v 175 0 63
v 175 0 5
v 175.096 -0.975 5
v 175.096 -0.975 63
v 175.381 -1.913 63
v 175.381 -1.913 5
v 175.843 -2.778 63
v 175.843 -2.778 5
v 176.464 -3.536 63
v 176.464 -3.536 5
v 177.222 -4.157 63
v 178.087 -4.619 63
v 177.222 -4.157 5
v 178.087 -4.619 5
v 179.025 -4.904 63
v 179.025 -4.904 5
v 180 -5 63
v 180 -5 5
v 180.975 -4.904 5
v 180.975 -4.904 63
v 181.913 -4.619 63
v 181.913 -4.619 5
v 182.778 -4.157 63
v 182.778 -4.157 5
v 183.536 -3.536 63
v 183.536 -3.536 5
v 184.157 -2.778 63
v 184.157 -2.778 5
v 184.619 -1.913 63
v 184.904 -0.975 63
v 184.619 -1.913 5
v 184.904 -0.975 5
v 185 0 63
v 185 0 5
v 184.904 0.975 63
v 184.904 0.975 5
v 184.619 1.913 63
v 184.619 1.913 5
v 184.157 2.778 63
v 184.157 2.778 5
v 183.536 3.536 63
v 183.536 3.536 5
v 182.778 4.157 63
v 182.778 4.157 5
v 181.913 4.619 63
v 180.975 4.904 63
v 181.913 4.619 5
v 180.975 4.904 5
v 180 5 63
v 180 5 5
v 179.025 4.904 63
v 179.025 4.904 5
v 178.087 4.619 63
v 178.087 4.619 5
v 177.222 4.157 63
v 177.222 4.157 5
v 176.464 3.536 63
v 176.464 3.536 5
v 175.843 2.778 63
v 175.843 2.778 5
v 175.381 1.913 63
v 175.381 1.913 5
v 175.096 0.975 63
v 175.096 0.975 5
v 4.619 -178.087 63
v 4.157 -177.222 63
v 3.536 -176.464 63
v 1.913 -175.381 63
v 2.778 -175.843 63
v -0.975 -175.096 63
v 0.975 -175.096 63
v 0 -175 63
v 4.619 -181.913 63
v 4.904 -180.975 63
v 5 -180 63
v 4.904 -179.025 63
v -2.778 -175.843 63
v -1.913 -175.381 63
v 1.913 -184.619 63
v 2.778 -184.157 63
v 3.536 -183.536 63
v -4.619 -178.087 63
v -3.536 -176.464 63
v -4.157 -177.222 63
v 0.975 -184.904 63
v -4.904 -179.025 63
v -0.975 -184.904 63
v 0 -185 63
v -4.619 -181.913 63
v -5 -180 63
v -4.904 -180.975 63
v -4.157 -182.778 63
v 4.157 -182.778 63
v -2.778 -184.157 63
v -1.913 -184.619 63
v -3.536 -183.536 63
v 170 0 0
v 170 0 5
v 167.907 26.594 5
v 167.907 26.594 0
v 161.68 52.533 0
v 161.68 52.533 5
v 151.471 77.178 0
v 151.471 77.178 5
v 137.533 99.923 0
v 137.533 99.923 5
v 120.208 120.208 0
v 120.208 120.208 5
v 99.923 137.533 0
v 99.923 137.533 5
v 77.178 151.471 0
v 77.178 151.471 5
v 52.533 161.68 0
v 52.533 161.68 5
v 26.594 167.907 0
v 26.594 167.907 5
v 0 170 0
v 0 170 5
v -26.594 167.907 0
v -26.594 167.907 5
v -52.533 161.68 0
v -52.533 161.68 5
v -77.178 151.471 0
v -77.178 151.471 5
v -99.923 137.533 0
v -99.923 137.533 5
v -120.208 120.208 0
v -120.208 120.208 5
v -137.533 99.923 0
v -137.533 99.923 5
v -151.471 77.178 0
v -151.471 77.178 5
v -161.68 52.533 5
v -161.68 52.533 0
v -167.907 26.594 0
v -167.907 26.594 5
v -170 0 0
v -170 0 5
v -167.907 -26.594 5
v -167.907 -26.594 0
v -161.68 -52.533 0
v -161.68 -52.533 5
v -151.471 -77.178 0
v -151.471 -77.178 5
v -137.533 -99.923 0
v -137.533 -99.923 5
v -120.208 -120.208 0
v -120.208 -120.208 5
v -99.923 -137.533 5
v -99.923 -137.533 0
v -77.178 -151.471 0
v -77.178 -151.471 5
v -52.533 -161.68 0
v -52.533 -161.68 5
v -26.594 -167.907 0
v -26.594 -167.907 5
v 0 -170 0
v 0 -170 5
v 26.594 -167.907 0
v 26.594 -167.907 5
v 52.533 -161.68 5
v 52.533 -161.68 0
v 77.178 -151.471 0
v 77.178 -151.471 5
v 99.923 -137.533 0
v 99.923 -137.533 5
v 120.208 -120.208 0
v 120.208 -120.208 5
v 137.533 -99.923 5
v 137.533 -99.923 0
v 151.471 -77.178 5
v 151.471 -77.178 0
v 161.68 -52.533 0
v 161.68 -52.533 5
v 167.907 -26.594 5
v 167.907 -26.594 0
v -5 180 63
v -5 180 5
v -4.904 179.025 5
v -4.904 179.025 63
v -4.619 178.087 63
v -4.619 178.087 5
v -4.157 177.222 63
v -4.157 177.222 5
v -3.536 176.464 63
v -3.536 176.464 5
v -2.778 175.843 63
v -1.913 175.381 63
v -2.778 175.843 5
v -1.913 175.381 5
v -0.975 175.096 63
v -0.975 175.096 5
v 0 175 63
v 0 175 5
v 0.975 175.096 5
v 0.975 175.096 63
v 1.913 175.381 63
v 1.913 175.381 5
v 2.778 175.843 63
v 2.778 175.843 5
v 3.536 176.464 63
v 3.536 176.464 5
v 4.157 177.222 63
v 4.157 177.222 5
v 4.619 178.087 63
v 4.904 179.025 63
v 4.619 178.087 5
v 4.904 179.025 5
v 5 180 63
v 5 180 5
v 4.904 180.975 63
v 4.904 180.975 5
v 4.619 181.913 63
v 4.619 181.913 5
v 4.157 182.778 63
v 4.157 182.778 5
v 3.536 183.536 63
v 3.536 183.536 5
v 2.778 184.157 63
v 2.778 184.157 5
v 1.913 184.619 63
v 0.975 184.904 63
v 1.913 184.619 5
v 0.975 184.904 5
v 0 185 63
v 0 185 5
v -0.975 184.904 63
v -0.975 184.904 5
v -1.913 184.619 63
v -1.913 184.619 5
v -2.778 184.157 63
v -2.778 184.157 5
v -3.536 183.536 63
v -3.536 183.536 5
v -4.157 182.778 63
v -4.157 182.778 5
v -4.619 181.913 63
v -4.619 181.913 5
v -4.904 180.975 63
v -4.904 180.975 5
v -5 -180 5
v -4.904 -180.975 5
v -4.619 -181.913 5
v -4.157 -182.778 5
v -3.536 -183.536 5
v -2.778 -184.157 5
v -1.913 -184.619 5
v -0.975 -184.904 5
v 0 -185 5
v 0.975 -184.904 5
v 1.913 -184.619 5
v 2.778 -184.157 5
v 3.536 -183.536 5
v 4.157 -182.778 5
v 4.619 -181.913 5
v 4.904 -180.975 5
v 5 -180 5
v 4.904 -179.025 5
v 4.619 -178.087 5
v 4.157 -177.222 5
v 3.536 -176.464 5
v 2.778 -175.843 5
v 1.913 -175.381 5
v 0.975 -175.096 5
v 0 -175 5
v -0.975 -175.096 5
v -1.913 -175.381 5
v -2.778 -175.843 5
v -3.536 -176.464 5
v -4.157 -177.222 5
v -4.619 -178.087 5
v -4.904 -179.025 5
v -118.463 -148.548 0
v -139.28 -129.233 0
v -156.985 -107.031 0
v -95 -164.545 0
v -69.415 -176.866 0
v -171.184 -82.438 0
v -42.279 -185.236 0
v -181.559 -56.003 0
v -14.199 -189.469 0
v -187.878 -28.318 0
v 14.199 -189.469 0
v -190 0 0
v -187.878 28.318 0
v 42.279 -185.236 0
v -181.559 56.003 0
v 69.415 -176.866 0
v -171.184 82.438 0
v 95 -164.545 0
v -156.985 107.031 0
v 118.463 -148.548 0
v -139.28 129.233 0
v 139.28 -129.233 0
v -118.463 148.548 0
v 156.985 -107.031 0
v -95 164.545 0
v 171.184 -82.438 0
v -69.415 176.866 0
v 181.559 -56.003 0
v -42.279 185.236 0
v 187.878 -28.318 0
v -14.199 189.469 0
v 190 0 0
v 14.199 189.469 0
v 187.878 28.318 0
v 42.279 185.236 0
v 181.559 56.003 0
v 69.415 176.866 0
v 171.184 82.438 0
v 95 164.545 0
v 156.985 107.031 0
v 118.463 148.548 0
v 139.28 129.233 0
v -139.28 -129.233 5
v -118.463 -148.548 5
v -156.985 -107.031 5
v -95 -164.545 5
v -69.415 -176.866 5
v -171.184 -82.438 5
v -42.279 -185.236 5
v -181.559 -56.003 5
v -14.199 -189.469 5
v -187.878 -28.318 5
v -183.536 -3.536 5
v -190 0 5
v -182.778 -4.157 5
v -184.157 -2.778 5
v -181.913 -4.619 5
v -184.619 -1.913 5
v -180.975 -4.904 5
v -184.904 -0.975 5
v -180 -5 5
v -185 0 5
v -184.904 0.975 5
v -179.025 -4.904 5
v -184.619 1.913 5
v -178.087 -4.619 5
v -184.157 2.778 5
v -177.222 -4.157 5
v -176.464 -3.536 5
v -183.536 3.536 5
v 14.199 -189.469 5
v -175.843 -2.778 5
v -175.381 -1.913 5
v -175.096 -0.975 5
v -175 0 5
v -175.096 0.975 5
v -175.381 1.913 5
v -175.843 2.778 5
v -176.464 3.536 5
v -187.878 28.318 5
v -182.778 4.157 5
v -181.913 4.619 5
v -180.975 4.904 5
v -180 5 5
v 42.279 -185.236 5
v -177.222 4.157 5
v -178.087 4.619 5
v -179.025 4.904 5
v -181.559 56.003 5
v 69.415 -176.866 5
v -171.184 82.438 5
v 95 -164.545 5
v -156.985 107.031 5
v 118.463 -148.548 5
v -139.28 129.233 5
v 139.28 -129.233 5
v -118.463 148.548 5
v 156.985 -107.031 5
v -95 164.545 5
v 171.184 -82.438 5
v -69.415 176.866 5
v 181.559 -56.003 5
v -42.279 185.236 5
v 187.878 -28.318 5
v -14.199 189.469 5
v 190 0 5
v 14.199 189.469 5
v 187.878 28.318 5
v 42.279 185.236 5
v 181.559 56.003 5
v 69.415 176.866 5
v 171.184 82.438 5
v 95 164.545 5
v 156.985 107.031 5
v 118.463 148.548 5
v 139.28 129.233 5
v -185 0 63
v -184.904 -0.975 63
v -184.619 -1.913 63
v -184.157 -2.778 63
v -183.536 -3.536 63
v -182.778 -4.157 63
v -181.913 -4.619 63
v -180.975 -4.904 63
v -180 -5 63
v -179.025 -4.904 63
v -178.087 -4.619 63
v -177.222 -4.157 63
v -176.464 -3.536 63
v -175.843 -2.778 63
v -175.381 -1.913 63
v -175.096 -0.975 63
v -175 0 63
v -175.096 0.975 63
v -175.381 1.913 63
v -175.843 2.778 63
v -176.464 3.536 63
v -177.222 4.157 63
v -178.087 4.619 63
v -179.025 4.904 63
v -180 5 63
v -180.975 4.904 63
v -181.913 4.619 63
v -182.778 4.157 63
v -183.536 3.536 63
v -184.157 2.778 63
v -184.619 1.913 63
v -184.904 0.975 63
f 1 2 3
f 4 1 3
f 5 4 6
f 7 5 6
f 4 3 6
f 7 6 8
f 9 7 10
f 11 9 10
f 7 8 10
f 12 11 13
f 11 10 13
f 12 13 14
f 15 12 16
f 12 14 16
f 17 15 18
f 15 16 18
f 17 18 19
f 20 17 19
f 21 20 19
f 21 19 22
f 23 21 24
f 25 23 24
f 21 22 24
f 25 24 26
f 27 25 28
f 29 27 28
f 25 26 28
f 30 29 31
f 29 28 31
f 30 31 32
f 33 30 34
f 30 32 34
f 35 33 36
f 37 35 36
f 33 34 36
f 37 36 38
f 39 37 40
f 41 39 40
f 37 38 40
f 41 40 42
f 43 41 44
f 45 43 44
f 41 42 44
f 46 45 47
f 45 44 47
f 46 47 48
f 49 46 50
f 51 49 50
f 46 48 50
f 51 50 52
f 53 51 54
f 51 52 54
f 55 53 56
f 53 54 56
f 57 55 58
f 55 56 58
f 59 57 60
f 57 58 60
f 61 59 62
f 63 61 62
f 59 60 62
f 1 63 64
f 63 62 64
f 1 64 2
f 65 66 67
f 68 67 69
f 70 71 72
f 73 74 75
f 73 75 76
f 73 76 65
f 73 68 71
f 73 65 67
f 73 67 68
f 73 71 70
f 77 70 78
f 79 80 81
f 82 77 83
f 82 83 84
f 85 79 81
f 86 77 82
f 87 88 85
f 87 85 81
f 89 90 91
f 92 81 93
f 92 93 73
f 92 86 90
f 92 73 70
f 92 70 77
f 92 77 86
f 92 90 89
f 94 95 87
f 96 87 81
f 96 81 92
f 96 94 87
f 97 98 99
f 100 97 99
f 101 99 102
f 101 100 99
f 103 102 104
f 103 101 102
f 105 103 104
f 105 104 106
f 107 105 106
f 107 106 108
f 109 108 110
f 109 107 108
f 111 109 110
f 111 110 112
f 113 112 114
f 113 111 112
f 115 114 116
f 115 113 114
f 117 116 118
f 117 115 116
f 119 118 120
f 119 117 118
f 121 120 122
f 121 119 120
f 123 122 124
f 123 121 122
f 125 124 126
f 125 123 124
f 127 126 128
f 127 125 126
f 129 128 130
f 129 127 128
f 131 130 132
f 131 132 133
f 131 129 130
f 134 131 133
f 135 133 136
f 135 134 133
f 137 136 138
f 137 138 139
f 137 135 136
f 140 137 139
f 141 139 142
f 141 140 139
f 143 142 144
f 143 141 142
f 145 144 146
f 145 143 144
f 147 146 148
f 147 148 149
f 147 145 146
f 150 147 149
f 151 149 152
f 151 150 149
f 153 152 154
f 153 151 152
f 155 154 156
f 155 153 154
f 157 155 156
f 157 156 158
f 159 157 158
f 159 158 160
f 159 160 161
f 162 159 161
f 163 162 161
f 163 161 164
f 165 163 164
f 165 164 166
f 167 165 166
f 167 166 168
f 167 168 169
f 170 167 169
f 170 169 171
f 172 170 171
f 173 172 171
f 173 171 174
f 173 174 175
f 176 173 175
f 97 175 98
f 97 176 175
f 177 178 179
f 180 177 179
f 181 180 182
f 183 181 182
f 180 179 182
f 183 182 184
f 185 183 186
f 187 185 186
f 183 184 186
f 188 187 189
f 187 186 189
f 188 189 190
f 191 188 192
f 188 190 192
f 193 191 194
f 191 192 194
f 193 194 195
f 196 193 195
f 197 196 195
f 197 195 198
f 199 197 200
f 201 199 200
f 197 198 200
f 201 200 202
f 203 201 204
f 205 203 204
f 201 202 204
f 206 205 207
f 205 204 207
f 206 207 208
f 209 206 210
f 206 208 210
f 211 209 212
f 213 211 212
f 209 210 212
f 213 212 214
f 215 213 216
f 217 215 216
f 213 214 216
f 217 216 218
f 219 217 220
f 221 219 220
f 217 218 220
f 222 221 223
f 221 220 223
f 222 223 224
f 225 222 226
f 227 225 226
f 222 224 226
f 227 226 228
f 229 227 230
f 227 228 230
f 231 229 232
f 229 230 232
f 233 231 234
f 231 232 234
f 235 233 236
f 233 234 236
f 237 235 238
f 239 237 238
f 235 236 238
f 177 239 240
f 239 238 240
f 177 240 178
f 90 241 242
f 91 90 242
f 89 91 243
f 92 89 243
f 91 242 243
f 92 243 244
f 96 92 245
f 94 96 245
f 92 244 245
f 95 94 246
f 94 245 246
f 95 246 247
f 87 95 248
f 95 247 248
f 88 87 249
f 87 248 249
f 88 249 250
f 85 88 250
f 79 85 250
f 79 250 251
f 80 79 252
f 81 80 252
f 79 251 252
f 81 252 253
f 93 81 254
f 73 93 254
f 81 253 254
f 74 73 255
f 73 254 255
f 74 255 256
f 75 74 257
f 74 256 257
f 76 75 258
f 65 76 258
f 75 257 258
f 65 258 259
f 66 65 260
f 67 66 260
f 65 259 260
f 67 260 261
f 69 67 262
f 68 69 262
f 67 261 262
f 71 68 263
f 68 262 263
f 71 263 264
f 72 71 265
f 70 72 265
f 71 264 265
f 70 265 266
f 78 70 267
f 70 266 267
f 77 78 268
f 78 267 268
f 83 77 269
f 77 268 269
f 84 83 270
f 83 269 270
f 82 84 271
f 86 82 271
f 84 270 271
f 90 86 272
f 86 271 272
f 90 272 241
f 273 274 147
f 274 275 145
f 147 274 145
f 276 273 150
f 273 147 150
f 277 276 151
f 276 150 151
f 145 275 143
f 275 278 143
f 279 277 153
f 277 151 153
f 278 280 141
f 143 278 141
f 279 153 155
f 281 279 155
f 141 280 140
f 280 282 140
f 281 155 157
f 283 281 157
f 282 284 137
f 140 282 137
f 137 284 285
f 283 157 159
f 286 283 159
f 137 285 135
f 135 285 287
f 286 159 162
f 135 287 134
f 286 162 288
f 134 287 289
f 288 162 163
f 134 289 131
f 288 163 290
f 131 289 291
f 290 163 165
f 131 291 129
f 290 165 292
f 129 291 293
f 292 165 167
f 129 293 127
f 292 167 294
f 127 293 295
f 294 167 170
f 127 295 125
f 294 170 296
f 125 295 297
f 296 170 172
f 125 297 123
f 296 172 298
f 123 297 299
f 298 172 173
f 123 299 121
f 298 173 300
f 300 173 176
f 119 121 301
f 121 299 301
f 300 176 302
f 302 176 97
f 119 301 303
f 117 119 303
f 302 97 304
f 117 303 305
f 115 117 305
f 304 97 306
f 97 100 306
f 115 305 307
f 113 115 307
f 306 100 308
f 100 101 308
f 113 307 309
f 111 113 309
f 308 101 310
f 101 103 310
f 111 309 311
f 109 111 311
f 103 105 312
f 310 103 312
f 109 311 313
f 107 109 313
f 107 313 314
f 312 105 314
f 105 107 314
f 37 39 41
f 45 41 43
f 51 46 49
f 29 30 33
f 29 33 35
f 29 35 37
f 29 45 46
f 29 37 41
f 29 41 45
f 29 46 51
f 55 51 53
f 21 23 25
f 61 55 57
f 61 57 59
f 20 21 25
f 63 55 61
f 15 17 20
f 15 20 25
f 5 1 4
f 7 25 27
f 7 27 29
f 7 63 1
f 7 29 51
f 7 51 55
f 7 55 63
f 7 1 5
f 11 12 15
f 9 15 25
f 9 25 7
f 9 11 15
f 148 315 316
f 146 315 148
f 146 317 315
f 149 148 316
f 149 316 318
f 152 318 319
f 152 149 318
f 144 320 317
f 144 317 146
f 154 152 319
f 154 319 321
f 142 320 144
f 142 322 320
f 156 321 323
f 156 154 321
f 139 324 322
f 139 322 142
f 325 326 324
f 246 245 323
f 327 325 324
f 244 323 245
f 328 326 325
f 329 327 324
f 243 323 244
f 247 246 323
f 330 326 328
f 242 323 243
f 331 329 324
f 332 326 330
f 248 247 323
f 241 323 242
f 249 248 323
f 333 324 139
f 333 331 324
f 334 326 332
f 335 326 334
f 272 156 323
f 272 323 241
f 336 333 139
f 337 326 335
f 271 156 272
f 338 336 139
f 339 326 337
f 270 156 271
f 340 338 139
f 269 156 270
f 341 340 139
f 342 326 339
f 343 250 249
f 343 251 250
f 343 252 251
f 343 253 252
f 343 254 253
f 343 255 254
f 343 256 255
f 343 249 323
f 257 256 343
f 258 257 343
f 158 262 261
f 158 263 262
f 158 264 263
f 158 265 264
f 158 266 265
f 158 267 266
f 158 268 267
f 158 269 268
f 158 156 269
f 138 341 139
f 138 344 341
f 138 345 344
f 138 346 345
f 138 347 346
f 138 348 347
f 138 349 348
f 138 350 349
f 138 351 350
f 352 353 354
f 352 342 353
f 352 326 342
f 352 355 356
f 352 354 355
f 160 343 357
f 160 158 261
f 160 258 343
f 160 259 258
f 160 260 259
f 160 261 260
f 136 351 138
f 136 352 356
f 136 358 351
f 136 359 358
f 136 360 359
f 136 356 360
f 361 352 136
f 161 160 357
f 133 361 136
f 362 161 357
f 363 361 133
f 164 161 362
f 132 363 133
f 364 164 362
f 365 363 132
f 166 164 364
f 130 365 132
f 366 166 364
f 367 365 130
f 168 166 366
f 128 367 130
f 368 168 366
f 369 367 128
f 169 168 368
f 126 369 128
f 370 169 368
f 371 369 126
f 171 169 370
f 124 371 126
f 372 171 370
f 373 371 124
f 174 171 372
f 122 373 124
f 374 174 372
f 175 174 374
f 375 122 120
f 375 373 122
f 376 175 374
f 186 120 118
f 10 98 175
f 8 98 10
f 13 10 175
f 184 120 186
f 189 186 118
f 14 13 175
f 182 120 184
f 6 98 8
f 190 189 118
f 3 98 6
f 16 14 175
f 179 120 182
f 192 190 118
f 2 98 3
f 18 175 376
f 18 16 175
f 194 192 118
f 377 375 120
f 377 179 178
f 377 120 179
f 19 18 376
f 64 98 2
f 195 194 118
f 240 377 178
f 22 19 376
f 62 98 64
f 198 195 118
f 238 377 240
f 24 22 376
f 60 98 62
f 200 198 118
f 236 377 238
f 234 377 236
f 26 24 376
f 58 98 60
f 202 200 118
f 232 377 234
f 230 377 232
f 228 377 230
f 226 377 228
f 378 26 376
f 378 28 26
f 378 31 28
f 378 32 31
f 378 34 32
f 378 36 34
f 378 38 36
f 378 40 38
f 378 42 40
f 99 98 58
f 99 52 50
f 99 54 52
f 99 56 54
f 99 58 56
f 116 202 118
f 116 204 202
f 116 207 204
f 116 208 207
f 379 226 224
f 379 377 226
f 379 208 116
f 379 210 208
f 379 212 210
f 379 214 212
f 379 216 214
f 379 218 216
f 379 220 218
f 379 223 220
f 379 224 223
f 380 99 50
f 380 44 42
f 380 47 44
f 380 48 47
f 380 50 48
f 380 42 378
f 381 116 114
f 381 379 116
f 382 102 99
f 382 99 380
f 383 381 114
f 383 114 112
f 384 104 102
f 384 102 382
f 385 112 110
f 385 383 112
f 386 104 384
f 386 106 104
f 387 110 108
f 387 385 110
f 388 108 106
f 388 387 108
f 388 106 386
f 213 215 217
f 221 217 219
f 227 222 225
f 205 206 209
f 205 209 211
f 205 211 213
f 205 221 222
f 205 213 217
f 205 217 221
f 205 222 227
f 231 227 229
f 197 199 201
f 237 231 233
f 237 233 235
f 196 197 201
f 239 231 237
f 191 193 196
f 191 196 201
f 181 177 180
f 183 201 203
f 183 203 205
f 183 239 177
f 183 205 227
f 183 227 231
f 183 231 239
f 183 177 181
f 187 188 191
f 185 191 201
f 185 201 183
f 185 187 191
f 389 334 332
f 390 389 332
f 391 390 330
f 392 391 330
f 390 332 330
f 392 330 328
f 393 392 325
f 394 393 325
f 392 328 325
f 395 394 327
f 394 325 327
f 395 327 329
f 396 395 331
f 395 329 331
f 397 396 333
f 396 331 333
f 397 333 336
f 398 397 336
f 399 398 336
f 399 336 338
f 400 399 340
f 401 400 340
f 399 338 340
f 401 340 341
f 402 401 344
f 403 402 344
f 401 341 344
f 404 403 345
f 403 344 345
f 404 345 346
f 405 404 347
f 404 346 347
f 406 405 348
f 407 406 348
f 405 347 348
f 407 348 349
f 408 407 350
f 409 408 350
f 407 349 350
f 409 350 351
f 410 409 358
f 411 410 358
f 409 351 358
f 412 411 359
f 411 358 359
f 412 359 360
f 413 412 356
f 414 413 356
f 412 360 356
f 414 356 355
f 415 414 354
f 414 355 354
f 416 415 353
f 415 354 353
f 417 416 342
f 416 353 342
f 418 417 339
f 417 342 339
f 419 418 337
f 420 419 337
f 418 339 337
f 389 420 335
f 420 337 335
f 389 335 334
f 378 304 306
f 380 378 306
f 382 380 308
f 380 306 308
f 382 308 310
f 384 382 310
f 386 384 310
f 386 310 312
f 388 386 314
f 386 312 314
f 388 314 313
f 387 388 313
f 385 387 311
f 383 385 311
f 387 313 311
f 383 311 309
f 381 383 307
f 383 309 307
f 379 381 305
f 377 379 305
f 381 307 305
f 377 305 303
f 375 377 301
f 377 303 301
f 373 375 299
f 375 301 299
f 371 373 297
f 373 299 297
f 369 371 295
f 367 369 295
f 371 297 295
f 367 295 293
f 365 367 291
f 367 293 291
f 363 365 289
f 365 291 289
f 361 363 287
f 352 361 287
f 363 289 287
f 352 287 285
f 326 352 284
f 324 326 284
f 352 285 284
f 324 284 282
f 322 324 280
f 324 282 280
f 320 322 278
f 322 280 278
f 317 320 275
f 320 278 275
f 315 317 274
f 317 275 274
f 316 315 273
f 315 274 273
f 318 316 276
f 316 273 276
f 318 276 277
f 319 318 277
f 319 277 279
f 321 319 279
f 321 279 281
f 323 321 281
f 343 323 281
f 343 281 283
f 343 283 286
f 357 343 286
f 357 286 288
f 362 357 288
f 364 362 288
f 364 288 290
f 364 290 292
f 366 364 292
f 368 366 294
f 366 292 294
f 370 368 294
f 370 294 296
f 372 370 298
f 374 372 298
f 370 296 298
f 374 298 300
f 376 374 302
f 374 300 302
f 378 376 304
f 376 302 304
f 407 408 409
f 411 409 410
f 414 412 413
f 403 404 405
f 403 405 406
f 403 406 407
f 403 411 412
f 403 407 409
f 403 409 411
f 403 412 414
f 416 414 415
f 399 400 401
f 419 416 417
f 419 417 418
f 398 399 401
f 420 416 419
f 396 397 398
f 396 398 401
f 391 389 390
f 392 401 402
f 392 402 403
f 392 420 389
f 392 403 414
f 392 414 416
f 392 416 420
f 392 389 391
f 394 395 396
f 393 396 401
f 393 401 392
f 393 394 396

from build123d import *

# Parameters (mm, degrees)
SKETCH_1_R      = 190
SKETCH_1_R_2    = 170
EXTRUDE_2_DEPTH = 5
SKETCH_2_R      = 5
EXTRUDE_3_DEPTH = 58


with BuildPart() as part:
    # 草图1 → 凸台-拉伸2 (new body)
    with BuildSketch(Plane.XY):
        Circle(SKETCH_1_R)
        Circle(SKETCH_1_R_2, mode=Mode.SUBTRACT)
    extrude(amount=EXTRUDE_2_DEPTH)

    # 草图2 → 凸台-拉伸3 (add)
    with BuildSketch(Plane.XY.offset(5)):
        with Locations(Location((0, 180, 0), (0, 0, 180))):
            Circle(SKETCH_2_R)
        with Locations(Location((-180, 0, 0), (0, 0, 180))):
            Circle(SKETCH_2_R)
        with Locations(Location((0, -180, 0), (0, 0, 180))):
            Circle(SKETCH_2_R)
        with Locations(Location((180, 0, 0), (0, 0, 180))):
            Circle(SKETCH_2_R)
    extrude(amount=EXTRUDE_3_DEPTH)


solid = part.part
